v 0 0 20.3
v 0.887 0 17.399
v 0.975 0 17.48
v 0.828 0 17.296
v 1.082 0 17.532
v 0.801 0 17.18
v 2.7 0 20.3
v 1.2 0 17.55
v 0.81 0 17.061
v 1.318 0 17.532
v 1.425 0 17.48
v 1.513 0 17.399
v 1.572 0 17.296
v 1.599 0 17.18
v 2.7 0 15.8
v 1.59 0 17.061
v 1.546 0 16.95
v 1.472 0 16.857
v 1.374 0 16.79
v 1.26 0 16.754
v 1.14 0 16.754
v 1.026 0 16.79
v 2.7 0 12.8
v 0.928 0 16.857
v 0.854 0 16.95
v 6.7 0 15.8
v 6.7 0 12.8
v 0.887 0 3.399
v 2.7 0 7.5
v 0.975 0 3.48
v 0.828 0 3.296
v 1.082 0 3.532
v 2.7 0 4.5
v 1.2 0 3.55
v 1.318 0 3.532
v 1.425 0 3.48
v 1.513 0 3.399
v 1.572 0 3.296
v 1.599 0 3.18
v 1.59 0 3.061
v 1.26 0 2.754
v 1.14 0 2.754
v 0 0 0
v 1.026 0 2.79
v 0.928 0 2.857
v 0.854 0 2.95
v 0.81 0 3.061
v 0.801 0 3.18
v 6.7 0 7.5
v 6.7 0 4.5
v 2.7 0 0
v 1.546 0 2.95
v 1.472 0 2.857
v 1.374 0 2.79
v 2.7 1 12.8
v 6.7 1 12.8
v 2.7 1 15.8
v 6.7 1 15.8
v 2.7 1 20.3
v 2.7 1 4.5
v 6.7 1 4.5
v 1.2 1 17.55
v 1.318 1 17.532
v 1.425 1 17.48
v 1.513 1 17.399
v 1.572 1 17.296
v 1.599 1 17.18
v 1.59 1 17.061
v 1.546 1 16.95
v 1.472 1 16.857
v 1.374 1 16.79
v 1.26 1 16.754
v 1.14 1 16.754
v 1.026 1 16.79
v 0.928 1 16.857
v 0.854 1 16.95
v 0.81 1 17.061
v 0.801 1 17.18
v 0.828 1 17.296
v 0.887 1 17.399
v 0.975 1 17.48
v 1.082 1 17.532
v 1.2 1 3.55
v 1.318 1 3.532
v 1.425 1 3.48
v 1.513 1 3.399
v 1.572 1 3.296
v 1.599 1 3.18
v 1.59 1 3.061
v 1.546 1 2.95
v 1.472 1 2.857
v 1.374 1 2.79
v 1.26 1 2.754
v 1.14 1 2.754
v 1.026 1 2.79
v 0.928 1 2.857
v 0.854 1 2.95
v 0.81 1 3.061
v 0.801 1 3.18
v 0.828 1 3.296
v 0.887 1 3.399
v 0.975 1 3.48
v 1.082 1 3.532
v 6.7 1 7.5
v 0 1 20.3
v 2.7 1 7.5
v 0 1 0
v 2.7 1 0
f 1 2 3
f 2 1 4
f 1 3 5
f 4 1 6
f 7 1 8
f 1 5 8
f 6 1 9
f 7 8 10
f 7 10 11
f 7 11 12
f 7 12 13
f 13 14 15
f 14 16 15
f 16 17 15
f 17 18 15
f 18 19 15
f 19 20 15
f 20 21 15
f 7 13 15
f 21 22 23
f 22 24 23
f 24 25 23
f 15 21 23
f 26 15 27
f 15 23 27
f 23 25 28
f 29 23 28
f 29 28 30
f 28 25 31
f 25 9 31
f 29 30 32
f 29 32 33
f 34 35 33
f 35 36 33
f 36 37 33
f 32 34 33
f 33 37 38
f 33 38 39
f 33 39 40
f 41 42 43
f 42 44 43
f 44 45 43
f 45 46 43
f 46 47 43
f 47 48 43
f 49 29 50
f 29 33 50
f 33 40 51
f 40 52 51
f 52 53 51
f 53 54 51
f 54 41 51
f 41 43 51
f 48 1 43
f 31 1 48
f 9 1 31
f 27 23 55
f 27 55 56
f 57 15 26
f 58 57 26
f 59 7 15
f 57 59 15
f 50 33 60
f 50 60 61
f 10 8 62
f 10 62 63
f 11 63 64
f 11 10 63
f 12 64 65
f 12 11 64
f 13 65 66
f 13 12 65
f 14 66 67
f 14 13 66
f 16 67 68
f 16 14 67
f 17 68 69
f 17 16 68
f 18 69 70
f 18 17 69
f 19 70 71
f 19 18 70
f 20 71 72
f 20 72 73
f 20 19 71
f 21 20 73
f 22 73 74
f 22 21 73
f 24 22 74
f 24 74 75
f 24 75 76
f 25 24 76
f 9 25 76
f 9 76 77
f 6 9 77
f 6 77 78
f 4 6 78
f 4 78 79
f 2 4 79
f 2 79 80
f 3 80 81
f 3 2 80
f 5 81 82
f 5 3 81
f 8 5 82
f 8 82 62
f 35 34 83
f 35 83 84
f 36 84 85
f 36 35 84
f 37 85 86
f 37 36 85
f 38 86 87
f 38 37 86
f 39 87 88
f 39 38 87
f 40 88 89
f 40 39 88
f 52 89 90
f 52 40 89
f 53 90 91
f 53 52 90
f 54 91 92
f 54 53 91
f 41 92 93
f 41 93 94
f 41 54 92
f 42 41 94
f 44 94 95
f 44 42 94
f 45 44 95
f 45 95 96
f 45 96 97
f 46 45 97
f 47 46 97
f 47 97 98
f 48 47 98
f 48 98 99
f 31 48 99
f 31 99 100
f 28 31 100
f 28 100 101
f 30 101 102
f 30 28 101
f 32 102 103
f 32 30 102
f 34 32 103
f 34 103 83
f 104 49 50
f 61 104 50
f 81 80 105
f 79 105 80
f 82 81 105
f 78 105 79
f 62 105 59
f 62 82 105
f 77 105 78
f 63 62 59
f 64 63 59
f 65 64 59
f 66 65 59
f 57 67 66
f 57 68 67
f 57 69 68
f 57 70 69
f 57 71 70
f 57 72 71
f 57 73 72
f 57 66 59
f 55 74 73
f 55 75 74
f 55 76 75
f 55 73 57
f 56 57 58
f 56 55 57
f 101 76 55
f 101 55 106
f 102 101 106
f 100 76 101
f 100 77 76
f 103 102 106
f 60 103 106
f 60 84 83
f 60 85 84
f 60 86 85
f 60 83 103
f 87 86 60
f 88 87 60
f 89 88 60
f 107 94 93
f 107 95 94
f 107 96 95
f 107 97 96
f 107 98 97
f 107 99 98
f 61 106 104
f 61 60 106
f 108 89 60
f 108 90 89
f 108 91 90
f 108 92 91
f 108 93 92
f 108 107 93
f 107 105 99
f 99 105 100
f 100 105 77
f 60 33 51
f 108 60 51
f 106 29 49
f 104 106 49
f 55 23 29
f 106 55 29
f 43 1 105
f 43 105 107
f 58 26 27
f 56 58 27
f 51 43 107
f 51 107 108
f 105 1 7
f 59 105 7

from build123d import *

# Parameters (mm, degrees)
SKETCH_1_R      = 0.4
EXTRUDE_1_DEPTH = 1


with BuildPart() as part:
    # Эскиз1 → Бобышка-Вытянуть1 (new body)
    with BuildSketch(Plane(origin=(0, 0, 0), x_dir=(1, 0, 0), z_dir=(0, 1, 0))):
        Polygon((2.7, 0), (0, 0), (0, -20.3), (2.7, -20.3), (2.7, -15.8), (6.7, -15.8), (6.7, -12.8), (2.7, -12.8), (2.7, -7.5), (6.7, -7.5), (6.7, -4.5), (2.7, -4.5), align=None)
        with Locations((1.2, -17.15)):
            Circle(SKETCH_1_R, mode=Mode.SUBTRACT)
        with Locations((1.2, -3.15)):
            Circle(SKETCH_1_R, mode=Mode.SUBTRACT)
    extrude(amount=EXTRUDE_1_DEPTH)


solid = part.part
